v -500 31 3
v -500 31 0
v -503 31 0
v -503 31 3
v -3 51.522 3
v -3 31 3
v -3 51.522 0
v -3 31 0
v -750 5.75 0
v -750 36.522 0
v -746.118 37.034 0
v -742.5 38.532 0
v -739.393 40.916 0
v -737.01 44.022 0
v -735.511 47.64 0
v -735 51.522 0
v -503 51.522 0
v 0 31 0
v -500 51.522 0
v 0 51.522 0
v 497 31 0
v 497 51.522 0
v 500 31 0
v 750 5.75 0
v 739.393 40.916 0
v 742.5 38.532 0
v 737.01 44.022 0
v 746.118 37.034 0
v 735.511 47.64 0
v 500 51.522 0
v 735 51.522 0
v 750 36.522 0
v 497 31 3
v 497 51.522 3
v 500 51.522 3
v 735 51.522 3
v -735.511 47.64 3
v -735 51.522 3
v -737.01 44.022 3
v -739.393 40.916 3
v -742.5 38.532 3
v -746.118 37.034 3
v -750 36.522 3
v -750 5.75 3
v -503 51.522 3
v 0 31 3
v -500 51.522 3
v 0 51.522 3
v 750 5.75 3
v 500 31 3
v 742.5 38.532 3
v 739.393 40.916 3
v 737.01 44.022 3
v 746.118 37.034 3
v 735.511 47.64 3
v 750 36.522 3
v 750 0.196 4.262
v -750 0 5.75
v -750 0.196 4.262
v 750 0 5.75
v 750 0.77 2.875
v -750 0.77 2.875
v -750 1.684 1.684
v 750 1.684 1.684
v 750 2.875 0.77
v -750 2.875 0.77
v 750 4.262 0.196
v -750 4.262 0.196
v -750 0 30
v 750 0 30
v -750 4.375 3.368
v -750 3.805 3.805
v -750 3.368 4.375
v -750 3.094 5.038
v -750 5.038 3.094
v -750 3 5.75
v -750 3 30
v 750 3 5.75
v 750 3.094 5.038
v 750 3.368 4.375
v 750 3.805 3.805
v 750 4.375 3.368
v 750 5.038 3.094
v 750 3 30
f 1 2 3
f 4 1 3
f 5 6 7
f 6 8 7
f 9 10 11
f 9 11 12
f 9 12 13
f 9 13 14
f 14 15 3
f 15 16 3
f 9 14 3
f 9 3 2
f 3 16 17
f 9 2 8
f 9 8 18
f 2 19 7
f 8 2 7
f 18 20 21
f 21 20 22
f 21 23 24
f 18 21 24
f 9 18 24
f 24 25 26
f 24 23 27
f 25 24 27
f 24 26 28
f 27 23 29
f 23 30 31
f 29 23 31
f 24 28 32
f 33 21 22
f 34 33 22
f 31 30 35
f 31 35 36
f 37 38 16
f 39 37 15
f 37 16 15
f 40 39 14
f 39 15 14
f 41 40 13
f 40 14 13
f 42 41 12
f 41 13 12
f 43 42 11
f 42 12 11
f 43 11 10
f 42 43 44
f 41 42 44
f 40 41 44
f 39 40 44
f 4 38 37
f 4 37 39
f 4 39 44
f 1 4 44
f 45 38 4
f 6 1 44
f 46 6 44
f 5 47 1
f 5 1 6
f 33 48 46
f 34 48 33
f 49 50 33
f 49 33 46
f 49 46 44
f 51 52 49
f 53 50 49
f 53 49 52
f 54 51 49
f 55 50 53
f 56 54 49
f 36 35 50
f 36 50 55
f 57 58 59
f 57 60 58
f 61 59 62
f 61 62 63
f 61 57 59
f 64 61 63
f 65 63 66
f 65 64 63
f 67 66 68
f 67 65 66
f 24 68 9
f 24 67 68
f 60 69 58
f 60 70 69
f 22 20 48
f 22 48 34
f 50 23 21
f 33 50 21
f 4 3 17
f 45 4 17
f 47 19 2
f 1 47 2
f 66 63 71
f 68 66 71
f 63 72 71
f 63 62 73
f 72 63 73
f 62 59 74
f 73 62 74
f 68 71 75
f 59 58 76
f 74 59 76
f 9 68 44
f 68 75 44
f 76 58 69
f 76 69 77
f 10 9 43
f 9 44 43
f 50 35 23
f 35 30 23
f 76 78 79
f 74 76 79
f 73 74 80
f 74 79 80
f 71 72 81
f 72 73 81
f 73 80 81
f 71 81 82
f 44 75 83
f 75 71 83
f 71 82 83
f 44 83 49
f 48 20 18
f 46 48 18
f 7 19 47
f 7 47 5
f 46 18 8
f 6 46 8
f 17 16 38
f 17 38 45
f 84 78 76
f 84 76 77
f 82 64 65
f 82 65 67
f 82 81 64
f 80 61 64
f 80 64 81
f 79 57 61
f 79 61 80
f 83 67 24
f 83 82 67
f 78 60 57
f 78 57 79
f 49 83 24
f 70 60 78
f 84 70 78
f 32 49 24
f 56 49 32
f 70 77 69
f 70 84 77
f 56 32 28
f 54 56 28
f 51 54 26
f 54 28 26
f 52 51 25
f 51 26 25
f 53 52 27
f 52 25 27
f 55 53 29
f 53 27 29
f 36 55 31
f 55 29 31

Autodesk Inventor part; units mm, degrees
ref_plane "YZ Plane" through (0, 0, 0) normal (1, 0, 0) x (0, 1, 0)
ref_plane "XZ Plane" through (0, 0, 0) normal (0, 1, 0) x (-1, 0, 0)
ref_plane "XY Plane" through (0, 0, 0) normal (0, 0, 1) x (1, 0, 0)
sketch "Sketch1" plane through (0, 0, 0) normal (0, 0, 1) x (1, 0, 0)
  line L0 (-750, 51.5224) -> (750, 51.5224)
  line L1 (750, 51.5224) -> (750, 0)
  line L2 (750, 0) -> (-750, 0)
  line L3 (-750, 0) -> (-750, 51.5224)
  point P0 (0, 0)
  point P1 (0, 0)
  dimension "d0" = 1500
  dimension "d1" = 51.5224
extrude "Plate1" add sketch "Sketch1" along normal blind 3
sketch "Sketch2" plane through (750, 3, 0) normal (0, -1, 0) x (1, 0, 0)
  line L0 (-1500, 0) -> (0, 0)
  line L1 (0, 0) -> (0, 30)
  line L2 (0, 30) -> (-1500, 30)
  line L3 (-1500, 30) -> (-1500, 0)
edge flange "Flange1" height 30 angle 90 thickness 3 bend radius 2.75 thickness toward (0, -1, 0) relief tear relief width 3 relief depth 1.5 edges at (0, 0, 3) wall of the first edge with corners at (-750, 3, 0) (750, 3, 0) (750, 3, 30) (-750, 3, 30)
bend "Bend1"
corner "Corner1"
sketch "Sketch5" plane through (0, 0, 0) normal (0, 0, -1) x (-1, 0, 0)
  line L0 (750, 51.5224) -> (-750, 51.5224) projected
  line L1 (500, 51.5224) -> (500, 31)
  line L2 (500, 31) -> (503, 31)
  line L3 (503, 31) -> (503, 51.5224)
  line L4 (750, 0) -> (-750, 0) projected
  point P0 (0, 0)
  dimension "d18" = 3
  dimension "d19" = 247
  dimension "d20" = 31
extrude "Extrusion1" cut sketch "Sketch5" against normal through all
pattern_linear "Rectangular Pattern1" count 3 spacing 500 along (1, 0, 0) of "Extrusion1"
sketch "Sketch6" plane through (0, 0, 0) normal (0, 0, -1) x (-1, 0, 0)
  line L0 (-750, 51.5224) -> (-750, 5.75) projected
  circle A0 centre (-750, 51.5224) radius 15
  line L1 (-750, 51.5224) -> (-500, 51.5224) projected
  point P0 (0, 0)
  point P1 (-735, 51.5224)
  point P2 (-750, 36.5224)
  dimension "d24" = 30
extrude "Extrusion2" cut sketch "Sketch6" against normal through all contours L1 A0 L0 picked at (-740.1254, 50.4098)
mirror "Mirror1" about plane through (0, 0, 0) normal (1, 0, 0) of "Extrusion2"
equation "\"d1\" = Стрингер_5"
equation "\"d18\" = Thickness"
equation "\"d2\" = Thickness"
equation "\"d3\" = BendReliefWidth"
equation "\"d4\" = BendReliefDepth"
equation "\"d5\" = MinimumRemnant"
equation "\"d6\" = TransitionRadius"
equation "\"d9\" = BendRadius"
equation "\"d10\" = CornerReliefSize"
equation "\"d11\" = GapSize"
equation "\"d12\" = JacobiRadiusSize"
equation "\"BendReliefWidth\" = Thickness"
equation "\"BendReliefDepth\" = 0.5 * Thickness"
equation "\"CornerReliefSize\" = 4 * Thickness"
equation "\"MinimumRemnant\" = 2 * Thickness"
equation "\"TransitionRadius\" = BendRadius"
equation "\"JacobiRadiusSize\" = BendRadius"
equation "\"GapSize\" = Thickness"
equation "\"Стрингер_5\" = 51.522376"
equation "\"Thickness\" = 3"
equation "\"BendRadius\" = 2.75"
properties part number "МОО 055 стрингер борт 5" material "Stainless Steel"
